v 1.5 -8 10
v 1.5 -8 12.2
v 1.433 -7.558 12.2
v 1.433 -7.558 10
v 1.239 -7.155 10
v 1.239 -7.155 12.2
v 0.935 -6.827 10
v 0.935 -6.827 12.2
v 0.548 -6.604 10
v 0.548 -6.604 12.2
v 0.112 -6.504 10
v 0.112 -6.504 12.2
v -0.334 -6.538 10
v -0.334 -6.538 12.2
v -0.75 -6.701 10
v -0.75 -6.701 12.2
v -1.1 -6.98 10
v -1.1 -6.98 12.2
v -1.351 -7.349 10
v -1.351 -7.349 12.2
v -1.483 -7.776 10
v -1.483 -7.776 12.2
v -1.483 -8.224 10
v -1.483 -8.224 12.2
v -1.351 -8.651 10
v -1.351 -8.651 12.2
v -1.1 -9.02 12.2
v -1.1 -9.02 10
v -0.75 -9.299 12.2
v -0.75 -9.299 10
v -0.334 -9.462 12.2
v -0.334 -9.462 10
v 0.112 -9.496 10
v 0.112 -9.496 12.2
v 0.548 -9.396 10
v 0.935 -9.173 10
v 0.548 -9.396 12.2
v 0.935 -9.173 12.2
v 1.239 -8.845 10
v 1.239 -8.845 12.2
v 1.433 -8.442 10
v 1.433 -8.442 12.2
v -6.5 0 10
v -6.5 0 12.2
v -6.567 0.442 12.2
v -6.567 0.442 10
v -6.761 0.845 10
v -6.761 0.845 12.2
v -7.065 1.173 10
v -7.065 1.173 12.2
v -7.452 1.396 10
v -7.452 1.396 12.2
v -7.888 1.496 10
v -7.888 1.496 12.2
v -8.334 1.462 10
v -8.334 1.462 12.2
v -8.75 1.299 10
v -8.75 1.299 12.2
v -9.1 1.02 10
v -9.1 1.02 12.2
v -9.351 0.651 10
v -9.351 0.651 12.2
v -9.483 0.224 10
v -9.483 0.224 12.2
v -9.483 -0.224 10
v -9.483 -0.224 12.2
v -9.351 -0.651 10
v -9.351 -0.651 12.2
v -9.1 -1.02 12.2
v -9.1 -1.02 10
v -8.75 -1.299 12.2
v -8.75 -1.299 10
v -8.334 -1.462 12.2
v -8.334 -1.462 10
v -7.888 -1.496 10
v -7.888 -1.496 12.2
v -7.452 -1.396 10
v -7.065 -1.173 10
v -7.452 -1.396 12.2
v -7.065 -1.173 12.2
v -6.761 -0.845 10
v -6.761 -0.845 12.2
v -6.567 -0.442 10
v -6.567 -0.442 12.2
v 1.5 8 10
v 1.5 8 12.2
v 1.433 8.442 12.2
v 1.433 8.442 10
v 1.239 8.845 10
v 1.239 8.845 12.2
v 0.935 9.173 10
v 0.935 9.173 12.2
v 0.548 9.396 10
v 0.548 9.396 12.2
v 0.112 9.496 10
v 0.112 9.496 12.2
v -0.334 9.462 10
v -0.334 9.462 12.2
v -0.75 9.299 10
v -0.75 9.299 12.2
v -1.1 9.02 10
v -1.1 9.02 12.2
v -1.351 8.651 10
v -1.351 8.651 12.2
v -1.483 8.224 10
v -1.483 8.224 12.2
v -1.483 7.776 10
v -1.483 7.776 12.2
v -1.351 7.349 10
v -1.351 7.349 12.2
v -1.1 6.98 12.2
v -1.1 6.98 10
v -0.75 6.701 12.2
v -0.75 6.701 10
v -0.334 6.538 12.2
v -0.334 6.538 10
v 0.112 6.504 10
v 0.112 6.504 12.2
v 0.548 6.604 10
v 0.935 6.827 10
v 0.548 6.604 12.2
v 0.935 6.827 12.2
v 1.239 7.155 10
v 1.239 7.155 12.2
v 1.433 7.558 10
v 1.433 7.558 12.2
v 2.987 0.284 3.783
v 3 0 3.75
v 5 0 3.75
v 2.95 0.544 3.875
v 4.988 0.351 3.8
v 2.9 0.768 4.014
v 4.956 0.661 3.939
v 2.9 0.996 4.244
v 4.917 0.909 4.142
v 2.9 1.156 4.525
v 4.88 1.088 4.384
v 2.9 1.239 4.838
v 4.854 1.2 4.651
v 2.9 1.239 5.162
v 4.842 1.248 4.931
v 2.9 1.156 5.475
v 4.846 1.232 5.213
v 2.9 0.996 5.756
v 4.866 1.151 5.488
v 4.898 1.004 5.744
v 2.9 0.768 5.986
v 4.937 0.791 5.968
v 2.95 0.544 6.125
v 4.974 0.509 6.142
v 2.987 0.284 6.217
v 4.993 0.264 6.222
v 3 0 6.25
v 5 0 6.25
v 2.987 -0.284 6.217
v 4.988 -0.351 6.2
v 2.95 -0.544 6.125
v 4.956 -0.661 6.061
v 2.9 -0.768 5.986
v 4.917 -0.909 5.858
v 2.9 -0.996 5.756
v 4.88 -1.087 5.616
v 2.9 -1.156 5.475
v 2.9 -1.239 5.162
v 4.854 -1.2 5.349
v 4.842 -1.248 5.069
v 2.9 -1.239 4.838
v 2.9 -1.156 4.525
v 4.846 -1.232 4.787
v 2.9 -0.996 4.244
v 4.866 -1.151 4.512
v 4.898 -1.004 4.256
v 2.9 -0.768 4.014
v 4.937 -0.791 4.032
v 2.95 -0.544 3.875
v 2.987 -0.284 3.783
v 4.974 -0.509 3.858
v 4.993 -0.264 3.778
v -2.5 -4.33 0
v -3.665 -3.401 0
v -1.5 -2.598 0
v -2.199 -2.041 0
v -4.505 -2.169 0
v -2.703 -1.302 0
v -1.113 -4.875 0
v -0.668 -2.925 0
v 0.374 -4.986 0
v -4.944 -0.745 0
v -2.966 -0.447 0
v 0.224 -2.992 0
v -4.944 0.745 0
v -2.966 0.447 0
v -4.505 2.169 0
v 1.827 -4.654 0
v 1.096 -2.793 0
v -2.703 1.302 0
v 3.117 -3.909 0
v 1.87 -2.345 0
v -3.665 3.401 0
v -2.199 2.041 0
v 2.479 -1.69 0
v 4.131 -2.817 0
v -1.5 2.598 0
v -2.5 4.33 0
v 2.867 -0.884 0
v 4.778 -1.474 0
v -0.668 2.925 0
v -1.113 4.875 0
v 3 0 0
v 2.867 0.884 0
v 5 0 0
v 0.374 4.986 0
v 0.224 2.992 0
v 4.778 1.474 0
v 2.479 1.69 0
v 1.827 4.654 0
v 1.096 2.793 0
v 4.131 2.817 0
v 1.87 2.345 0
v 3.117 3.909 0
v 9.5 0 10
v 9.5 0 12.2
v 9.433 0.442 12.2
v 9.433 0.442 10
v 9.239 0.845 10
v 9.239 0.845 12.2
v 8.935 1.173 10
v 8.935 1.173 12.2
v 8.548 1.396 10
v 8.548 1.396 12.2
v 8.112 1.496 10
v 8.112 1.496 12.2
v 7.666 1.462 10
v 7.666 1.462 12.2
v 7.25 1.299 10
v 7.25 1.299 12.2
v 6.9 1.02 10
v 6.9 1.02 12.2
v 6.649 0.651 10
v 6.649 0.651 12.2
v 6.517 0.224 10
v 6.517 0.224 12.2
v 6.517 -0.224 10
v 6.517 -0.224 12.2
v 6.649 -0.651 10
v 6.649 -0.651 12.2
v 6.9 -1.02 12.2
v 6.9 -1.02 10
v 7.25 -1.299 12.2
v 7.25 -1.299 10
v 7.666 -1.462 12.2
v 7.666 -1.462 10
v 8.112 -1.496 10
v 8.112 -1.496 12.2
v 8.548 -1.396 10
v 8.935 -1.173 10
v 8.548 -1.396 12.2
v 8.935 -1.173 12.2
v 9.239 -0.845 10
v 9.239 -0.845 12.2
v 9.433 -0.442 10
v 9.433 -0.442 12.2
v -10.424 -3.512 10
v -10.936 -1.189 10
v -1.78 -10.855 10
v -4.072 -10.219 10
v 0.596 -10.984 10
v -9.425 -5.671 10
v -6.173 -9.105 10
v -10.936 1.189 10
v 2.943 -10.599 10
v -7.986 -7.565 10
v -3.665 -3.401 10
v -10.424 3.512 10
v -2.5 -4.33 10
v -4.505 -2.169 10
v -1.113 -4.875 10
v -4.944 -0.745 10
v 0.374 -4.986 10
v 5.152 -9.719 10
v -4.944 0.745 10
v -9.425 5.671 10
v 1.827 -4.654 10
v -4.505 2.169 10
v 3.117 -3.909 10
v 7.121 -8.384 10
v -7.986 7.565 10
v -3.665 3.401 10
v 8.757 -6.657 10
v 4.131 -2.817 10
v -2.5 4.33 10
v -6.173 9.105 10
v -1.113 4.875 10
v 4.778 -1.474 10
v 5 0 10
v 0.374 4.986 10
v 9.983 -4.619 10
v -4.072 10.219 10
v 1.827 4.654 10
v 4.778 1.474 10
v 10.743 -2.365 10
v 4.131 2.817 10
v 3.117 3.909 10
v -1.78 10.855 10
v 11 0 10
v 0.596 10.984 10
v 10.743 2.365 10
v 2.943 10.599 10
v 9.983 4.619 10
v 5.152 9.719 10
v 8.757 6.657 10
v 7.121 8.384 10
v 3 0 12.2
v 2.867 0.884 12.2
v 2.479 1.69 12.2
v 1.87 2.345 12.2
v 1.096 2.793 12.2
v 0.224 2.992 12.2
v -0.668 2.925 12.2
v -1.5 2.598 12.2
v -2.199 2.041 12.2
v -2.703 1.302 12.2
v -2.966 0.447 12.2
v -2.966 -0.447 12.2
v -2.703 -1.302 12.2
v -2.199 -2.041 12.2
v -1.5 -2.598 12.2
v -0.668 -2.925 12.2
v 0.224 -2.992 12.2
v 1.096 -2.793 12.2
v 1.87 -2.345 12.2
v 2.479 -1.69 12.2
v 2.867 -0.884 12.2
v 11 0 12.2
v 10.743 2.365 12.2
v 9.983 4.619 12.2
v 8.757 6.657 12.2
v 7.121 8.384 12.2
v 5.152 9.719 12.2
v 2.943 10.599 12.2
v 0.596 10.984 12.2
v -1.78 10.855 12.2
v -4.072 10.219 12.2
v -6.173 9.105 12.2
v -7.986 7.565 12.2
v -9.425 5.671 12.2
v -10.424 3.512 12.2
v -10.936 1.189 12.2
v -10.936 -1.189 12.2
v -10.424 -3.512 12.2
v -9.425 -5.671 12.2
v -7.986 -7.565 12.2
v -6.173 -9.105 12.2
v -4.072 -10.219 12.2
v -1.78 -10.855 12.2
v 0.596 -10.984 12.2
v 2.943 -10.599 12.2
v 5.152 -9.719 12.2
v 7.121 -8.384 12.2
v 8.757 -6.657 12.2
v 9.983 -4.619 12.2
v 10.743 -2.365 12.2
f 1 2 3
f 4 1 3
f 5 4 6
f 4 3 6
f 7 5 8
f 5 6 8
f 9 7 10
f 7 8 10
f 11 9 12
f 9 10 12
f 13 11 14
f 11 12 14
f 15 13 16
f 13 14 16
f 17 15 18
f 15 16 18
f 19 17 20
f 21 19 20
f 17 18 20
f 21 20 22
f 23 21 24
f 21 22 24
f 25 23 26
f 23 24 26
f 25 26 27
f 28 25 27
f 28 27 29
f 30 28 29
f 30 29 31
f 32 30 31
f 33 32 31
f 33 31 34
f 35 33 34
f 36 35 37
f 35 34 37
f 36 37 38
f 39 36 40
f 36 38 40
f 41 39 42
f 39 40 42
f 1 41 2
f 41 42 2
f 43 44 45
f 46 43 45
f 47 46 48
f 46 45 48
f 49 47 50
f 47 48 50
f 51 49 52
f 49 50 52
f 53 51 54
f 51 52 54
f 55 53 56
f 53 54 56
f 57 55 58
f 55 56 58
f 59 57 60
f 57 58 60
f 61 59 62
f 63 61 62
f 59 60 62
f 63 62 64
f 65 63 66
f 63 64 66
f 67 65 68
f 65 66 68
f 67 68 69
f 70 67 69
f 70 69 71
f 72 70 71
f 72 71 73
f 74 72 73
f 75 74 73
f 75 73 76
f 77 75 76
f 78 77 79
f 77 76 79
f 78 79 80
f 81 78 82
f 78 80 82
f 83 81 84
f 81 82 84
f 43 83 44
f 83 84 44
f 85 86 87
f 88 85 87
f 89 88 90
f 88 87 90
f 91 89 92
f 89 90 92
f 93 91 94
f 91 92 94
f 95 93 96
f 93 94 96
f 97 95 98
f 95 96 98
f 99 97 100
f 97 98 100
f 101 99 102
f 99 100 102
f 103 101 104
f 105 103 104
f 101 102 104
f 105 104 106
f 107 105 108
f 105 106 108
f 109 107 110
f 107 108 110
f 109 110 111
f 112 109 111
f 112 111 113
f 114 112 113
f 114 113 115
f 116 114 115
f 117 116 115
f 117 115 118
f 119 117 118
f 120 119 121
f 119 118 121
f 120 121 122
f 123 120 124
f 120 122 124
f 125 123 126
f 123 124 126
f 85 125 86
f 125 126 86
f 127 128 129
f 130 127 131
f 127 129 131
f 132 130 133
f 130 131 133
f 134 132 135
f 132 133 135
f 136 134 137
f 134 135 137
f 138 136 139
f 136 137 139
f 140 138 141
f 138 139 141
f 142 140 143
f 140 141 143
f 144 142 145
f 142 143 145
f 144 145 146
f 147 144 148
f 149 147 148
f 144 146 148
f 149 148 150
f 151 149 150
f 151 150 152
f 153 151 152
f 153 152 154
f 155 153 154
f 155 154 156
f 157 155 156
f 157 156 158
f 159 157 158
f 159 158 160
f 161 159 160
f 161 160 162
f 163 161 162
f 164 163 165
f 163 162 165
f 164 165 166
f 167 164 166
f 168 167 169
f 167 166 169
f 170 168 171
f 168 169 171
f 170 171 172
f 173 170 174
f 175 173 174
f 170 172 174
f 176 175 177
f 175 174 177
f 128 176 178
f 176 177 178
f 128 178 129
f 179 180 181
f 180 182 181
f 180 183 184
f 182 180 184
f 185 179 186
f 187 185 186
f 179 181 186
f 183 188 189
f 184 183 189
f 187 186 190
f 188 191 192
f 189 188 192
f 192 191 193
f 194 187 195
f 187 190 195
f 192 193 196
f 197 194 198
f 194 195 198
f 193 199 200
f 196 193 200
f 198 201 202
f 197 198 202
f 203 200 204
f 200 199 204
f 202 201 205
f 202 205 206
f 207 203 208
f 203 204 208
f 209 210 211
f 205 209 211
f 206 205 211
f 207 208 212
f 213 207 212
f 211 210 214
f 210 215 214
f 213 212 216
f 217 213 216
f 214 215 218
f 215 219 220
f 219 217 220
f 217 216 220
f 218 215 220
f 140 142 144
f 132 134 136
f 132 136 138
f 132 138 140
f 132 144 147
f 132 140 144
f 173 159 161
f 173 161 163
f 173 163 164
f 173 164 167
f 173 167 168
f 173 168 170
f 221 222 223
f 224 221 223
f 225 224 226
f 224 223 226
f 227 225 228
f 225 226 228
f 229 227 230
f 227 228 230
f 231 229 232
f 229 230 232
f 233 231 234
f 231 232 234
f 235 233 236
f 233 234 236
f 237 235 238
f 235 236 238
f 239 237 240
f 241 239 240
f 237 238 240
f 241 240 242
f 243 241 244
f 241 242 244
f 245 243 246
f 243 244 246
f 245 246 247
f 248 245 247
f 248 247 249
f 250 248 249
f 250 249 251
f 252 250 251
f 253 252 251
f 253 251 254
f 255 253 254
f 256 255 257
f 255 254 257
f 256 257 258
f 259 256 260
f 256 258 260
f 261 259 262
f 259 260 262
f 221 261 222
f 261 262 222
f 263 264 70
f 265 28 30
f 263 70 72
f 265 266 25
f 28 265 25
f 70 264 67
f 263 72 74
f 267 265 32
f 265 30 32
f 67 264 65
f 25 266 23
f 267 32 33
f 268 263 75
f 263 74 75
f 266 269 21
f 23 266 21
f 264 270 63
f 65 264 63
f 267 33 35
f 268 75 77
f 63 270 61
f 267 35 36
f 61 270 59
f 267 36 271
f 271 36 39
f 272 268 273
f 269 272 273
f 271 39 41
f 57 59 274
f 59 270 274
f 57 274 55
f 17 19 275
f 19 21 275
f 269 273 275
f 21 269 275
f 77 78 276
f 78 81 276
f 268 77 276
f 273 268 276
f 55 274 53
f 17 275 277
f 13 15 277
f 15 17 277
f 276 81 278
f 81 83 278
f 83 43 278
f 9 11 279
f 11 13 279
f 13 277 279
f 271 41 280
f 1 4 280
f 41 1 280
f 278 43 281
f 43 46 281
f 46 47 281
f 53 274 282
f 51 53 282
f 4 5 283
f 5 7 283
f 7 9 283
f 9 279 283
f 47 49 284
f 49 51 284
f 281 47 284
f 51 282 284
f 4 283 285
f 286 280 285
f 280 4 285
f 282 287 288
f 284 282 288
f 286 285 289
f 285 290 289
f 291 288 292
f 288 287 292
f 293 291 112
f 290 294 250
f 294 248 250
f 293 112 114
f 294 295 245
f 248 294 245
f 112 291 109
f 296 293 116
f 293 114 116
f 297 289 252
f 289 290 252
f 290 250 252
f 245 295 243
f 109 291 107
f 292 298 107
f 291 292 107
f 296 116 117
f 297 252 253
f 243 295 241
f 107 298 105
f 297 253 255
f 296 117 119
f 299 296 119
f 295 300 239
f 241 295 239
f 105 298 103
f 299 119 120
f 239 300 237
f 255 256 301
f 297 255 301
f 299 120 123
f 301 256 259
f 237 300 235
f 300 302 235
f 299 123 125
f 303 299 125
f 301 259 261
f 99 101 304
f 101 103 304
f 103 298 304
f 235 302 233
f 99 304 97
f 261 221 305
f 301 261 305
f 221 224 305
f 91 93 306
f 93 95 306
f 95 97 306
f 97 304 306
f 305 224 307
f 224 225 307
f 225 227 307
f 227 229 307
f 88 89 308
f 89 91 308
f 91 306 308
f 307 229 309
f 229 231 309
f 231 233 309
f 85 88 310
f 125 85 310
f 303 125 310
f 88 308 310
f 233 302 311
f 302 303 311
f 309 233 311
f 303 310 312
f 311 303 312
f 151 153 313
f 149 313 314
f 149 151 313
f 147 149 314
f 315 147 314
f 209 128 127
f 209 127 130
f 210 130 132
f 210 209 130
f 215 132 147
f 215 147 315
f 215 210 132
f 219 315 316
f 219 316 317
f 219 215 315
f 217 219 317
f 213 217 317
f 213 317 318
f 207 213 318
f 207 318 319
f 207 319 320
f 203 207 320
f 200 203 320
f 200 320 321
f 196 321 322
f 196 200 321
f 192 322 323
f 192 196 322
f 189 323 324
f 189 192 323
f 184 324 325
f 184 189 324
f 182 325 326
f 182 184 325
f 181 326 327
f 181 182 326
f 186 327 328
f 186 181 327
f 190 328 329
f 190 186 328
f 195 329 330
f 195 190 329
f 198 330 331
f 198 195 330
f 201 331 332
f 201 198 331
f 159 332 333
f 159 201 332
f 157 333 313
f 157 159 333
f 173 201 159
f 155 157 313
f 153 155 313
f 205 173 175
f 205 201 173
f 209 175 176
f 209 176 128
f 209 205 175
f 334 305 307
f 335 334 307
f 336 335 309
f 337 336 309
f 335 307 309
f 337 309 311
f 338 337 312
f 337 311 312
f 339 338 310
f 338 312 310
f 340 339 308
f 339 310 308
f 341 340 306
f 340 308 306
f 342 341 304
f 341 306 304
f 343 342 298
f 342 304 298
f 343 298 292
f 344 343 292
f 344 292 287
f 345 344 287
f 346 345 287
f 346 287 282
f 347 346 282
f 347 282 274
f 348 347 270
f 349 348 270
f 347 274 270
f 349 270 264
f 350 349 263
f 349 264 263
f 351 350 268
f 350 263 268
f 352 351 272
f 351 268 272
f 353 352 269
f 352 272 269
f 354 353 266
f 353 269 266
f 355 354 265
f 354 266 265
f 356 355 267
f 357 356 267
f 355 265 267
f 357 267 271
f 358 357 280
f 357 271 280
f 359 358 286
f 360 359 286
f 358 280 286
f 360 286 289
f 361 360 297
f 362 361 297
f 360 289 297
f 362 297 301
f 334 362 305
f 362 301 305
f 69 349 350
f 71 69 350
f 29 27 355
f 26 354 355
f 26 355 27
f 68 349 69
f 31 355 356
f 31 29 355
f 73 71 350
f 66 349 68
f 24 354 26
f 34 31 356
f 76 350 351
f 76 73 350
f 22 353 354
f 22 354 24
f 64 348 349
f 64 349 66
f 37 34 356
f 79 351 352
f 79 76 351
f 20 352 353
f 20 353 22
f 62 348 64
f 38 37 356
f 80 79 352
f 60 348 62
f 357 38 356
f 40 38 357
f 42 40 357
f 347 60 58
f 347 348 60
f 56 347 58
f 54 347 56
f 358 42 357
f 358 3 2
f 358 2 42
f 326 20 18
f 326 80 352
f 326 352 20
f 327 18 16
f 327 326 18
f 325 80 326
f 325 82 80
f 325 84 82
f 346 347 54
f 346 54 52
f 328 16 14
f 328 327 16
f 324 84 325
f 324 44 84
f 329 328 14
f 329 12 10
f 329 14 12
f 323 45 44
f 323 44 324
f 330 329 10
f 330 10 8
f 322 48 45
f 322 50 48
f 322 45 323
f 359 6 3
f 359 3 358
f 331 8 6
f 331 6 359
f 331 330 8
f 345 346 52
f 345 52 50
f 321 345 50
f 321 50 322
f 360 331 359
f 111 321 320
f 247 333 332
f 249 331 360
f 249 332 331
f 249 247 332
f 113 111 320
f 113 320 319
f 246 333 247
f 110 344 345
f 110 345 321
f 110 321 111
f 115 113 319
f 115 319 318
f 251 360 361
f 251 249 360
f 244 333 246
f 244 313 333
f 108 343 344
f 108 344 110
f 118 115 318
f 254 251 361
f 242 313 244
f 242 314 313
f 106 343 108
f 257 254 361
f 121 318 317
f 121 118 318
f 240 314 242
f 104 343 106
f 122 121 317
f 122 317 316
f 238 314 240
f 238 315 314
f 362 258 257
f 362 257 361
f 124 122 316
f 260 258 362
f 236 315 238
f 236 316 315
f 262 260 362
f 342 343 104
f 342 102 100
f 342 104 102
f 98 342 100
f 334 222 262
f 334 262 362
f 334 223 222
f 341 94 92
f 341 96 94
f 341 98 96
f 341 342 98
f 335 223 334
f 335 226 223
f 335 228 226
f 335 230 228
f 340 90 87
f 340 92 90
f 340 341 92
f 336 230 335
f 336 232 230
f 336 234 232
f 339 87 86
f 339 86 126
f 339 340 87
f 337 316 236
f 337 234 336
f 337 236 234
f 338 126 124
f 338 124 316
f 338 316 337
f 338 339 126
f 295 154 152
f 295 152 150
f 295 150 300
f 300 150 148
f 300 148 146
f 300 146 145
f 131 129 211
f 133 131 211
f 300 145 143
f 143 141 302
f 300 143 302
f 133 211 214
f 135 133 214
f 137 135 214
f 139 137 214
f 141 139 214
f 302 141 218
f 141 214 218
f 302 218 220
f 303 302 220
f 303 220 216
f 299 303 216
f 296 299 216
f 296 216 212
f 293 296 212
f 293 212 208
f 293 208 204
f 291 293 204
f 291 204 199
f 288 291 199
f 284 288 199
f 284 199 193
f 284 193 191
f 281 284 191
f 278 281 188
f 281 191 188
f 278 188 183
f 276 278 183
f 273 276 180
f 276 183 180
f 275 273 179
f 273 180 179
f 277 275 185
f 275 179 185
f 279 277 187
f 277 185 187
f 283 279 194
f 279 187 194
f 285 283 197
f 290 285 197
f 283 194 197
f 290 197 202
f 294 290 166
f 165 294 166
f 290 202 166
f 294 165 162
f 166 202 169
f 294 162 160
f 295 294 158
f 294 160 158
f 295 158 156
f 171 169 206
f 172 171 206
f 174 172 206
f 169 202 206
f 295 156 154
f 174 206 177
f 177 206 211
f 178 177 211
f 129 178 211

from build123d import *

# Parameters (mm, degrees)
SKETCH_1_R                           = 5
SKETCH_1_R_2                         = 3
HUB_OD10_ID6_L10_DEPTH               = 10
SKETCH_2_R                           = 11
SKETCH_2_R_2                         = 3
FLANGE_OD22_T2P2_DEPTH               = 2.2
SKETCH_3_R                           = 1.5
F_4XD3_ON_PCD16_DEPTH                = 2.2
SKETCH_4_R                           = 1.25
M3_GRUB_SCREW_RADIAL_REFERENCE_DEPTH = 2.1


with BuildPart() as part:
    # 草图1 → Hub_OD10_ID6_L10 (new body)
    with BuildSketch(Plane.XY):
        Circle(SKETCH_1_R)
        Circle(SKETCH_1_R_2, mode=Mode.SUBTRACT)
    extrude(amount=HUB_OD10_ID6_L10_DEPTH)

    # 草图2 → Flange_OD22_T2p2 (add)
    with BuildSketch(Plane.XY.offset(10)):
        Circle(SKETCH_2_R)
        Circle(SKETCH_2_R_2, mode=Mode.SUBTRACT)
    extrude(amount=FLANGE_OD22_T2P2_DEPTH)

    # 草图3 → 4xD3_on_PCD16 (cut)
    with BuildSketch(Plane.XY.offset(12.2)):
        with Locations((8, 0)):
            Circle(SKETCH_3_R)
        with Locations((0, 8)):
            Circle(SKETCH_3_R)
        with Locations((-8, 0)):
            Circle(SKETCH_3_R)
        with Locations((0, -8)):
            Circle(SKETCH_3_R)
    extrude(amount=-F_4XD3_ON_PCD16_DEPTH, mode=Mode.SUBTRACT)

    # 草图4 → M3_grub_screw_radial_reference (cut)
    with BuildSketch(Plane(origin=(5, 0, 0), x_dir=(0, 0, -1), z_dir=(1, 0, 0))):
        with Locations((-5, 0)):
            Circle(SKETCH_4_R)
    extrude(amount=-M3_GRUB_SCREW_RADIAL_REFERENCE_DEPTH, mode=Mode.SUBTRACT)


solid = part.part
